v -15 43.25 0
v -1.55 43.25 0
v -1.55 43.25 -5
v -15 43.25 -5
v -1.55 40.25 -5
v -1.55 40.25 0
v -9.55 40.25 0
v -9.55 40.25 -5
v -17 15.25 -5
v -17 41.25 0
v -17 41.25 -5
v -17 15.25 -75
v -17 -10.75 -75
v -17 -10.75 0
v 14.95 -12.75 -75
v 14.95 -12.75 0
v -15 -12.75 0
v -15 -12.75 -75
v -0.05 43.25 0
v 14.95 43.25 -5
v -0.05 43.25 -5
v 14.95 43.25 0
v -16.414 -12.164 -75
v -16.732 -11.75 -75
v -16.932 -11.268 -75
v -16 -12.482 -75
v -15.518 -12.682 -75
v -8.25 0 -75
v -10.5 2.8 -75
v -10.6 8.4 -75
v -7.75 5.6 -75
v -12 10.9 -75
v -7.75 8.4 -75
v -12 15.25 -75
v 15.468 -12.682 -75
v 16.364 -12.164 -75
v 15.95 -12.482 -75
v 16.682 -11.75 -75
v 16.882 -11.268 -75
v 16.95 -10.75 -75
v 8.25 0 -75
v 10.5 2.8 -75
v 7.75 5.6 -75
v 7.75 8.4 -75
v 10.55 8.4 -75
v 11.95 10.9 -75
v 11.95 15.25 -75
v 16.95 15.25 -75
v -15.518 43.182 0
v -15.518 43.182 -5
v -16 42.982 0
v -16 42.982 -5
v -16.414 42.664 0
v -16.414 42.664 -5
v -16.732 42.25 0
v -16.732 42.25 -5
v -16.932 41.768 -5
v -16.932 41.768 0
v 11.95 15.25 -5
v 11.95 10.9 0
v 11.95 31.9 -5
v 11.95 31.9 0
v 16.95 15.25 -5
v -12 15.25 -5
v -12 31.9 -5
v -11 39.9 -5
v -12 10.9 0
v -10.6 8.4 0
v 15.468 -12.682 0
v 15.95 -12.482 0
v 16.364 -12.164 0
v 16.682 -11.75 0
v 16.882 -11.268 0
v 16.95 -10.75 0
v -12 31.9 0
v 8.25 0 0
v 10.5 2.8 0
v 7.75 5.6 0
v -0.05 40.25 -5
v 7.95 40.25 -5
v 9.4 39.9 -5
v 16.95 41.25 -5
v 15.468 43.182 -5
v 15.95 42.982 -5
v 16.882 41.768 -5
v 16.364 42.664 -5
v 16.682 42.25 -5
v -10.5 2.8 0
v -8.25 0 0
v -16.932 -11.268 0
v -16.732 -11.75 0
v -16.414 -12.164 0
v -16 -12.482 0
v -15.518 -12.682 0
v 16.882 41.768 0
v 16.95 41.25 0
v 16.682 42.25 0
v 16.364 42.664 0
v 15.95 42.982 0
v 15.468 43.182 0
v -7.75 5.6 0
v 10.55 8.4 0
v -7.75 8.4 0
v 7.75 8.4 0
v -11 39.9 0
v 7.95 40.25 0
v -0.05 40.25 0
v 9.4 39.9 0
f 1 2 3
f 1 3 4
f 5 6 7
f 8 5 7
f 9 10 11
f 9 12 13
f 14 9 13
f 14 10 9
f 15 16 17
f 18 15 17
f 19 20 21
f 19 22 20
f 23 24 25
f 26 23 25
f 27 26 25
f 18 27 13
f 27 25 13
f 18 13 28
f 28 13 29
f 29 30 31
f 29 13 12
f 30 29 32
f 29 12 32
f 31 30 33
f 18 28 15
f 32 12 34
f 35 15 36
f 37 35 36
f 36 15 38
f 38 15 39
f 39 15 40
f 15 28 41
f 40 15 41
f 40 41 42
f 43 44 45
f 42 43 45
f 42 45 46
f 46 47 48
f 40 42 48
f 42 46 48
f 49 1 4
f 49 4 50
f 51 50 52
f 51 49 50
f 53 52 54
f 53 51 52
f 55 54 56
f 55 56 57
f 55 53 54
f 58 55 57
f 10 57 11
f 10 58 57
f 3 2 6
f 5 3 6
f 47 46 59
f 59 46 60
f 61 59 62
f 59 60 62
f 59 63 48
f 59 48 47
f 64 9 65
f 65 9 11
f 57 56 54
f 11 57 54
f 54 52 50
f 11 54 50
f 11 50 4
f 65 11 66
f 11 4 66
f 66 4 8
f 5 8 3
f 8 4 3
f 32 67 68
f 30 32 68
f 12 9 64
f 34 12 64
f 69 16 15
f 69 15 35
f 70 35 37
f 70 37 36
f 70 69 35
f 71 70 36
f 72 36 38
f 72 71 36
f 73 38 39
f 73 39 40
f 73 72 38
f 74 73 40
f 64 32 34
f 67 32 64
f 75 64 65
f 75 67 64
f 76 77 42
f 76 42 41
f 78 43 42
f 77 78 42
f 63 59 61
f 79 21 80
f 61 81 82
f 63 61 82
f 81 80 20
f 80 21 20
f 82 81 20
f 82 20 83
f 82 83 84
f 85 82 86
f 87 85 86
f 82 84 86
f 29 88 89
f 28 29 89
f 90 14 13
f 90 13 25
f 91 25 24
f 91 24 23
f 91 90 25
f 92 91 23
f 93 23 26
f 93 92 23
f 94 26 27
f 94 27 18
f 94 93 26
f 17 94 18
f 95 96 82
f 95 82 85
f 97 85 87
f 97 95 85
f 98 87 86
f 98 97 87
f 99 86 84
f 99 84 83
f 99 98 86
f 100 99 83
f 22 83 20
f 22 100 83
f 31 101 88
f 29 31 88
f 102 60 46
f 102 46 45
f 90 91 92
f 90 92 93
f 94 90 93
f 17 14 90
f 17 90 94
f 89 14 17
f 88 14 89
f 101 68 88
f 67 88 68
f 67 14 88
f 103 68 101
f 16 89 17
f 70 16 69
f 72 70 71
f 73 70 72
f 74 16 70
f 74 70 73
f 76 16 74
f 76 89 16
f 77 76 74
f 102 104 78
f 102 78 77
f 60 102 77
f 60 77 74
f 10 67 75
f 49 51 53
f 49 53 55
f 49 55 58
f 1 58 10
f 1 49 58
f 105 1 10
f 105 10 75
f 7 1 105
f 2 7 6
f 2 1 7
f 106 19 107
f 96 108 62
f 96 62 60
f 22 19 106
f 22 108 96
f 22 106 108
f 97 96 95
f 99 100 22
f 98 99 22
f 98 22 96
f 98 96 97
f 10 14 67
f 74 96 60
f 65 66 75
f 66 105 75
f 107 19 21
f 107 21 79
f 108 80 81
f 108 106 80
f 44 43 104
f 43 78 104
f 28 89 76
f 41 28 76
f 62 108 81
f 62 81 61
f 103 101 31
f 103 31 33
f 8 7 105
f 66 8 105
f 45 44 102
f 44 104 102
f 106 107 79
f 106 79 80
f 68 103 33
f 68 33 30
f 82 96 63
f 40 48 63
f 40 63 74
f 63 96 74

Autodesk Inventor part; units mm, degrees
ref_plane "YZ Plane" through (0, 0, 0) normal (1, 0, 0) x (0, 1, 0)
ref_plane "XZ Plane" through (0, 0, 0) normal (0, 1, 0) x (-1, 0, 0)
ref_plane "XY Plane" through (0, 0, 0) normal (0, 0, 1) x (1, 0, 0)
sketch "Boceto1" plane through (0, 0, 0) normal (0, 0, 1) x (1, 0, 0)
  line L0 (0, 0) -> (8.25, 0)
  line L1 (-10.5, 2.8) -> (10.5, 2.8) construction
  line L2 (-7.75, 5.6) -> (7.75, 5.6) construction
  line L3 (10.5, 2.8) -> (8.25, 0)
  line L4 (7.75, 5.6) -> (10.5, 2.8)
  line L5 (7.75, 5.6) -> (7.75, 8.4)
  line L6 (7.75, 8.4) -> (10.55, 8.4)
  line L7 (11.95, 10.9) -> (10.55, 8.4)
  line L8 (11.95, 10.9) -> (11.95, 31.9)
  line L9 (11.95, 10.9) -> (32.95, 10.9) construction
  line L10 (9.4, 39.9) -> (11.95, 31.9)
  line L11 (9.4, 39.9) -> (9.75, 39.9) construction
  line L12 (2.95, 40.25) -> (5.95, 40.25) construction
  line L13 (0, 43.25) -> (-0.05, 43.25)
  line L14 (-3.05, 43.25) -> (-0.05, 43.25) construction
  line L15 (-0.05, 43.25) -> (-0.05, 40.25)
  line L16 (-0.05, 40.25) -> (7.95, 40.25)
  line L17 (7.95, 40.25) -> (9.4, 39.9)
  line L18 (0, 0) -> (-8.25, 0)
  line L19 (-10.5, 2.8) -> (-8.25, 0)
  line L20 (-7.75, 5.6) -> (-10.5, 2.8)
  line L21 (-7.75, 5.6) -> (-7.75, 8.4)
  line L22 (-7.75, 8.4) -> (-10.6, 8.4)
  line L23 (-12, 10.9) -> (-10.6, 8.4)
  line L24 (-12, 10.9) -> (-12, 31.9)
  line L25 (-11, 39.9) -> (-12, 31.9)
  line L26 (-11, 39.9) -> (-11.35, 39.9) construction
  line L27 (0, 43.25) -> (-1.5, 43.25)
  line L28 (-1.55, 43.25) -> (-1.55, 40.25)
  line L29 (-1.55, 40.25) -> (-9.55, 40.25)
  line L30 (-9.55, 40.25) -> (-11, 39.9)
  line L31 (-3.5, 43.25) -> (-1.5, 43.25) construction
  line L32 (0, 43.25) -> (-15, 43.25)
  line L33 (-17, 41.25) -> (-17, 15.25)
  line L34 (-17, 15.25) -> (-12, 15.25)
  line L35 (-17, 15.25) -> (-17, -10.75)
  line L36 (-15, -12.75) -> (0, -12.75)
  line L37 (16.95, 41.25) -> (16.95, 15.25)
  line L38 (16.95, 15.25) -> (11.9, 15.25)
  line L39 (16.95, 15.25) -> (16.95, -10.75)
  line L40 (14.95, -12.75) -> (0, -12.75)
  line L41 (14.95, 43.25) -> (-0.05, 43.25)
  arc A0 (-15, 43.25) -> (-17, 41.25) centre (-15, 41.25) ccw
  arc A1 (16.95, 41.25) -> (14.95, 43.25) centre (14.95, 41.25) ccw
  arc A2 (14.95, -12.75) -> (16.95, -10.75) centre (14.95, -10.75) ccw
  arc A3 (-17, -10.75) -> (-15, -12.75) centre (-15, -10.75) ccw
  point P0 (-5.95, 40.25)
  point P1 (-0.05, 43.25)
  point P2 (-17, 43.25)
  point P3 (16.95, 43.25)
  point P4 (-17, -12.75)
  point P5 (16.95, -12.75)
  point P6 (11.95, 15.25)
  point P7 (-1.55, 43.25)
  dimension "d40" = 2.8
  dimension "d45" = 90
  dimension "d52" = 8.25
  dimension "d53" = 2.8
  dimension "d54" = 2.8
  dimension "d61" = 3
  dimension "d63" = 3
  dimension "d65" = 8
  dimension "d71" = 17
  dimension "d73" = 28
  dimension "d74" = 28
  dimension "d79" = 17
  dimension "d80" = 5
  dimension "d81" = 5
  dimension "d82" = 2
extrude "Extrusión2" add sketch "Boceto1" against normal blind 5 contours L8 L10 L17 L16 L15 L13 L41 A1 L37 L38 | L34 L33 A0 L32 L28 L29 L30 L25 L24
extrude "Extrusión3" add sketch "Boceto1" against normal blind 75 contours L0 L3 L4 L5 L6 L7 L8 L38 L39 A2 L40 L36 A3 L35 L34 L24 L23 L22 L21 L20 L19 L18
properties part number "CaseV1"
